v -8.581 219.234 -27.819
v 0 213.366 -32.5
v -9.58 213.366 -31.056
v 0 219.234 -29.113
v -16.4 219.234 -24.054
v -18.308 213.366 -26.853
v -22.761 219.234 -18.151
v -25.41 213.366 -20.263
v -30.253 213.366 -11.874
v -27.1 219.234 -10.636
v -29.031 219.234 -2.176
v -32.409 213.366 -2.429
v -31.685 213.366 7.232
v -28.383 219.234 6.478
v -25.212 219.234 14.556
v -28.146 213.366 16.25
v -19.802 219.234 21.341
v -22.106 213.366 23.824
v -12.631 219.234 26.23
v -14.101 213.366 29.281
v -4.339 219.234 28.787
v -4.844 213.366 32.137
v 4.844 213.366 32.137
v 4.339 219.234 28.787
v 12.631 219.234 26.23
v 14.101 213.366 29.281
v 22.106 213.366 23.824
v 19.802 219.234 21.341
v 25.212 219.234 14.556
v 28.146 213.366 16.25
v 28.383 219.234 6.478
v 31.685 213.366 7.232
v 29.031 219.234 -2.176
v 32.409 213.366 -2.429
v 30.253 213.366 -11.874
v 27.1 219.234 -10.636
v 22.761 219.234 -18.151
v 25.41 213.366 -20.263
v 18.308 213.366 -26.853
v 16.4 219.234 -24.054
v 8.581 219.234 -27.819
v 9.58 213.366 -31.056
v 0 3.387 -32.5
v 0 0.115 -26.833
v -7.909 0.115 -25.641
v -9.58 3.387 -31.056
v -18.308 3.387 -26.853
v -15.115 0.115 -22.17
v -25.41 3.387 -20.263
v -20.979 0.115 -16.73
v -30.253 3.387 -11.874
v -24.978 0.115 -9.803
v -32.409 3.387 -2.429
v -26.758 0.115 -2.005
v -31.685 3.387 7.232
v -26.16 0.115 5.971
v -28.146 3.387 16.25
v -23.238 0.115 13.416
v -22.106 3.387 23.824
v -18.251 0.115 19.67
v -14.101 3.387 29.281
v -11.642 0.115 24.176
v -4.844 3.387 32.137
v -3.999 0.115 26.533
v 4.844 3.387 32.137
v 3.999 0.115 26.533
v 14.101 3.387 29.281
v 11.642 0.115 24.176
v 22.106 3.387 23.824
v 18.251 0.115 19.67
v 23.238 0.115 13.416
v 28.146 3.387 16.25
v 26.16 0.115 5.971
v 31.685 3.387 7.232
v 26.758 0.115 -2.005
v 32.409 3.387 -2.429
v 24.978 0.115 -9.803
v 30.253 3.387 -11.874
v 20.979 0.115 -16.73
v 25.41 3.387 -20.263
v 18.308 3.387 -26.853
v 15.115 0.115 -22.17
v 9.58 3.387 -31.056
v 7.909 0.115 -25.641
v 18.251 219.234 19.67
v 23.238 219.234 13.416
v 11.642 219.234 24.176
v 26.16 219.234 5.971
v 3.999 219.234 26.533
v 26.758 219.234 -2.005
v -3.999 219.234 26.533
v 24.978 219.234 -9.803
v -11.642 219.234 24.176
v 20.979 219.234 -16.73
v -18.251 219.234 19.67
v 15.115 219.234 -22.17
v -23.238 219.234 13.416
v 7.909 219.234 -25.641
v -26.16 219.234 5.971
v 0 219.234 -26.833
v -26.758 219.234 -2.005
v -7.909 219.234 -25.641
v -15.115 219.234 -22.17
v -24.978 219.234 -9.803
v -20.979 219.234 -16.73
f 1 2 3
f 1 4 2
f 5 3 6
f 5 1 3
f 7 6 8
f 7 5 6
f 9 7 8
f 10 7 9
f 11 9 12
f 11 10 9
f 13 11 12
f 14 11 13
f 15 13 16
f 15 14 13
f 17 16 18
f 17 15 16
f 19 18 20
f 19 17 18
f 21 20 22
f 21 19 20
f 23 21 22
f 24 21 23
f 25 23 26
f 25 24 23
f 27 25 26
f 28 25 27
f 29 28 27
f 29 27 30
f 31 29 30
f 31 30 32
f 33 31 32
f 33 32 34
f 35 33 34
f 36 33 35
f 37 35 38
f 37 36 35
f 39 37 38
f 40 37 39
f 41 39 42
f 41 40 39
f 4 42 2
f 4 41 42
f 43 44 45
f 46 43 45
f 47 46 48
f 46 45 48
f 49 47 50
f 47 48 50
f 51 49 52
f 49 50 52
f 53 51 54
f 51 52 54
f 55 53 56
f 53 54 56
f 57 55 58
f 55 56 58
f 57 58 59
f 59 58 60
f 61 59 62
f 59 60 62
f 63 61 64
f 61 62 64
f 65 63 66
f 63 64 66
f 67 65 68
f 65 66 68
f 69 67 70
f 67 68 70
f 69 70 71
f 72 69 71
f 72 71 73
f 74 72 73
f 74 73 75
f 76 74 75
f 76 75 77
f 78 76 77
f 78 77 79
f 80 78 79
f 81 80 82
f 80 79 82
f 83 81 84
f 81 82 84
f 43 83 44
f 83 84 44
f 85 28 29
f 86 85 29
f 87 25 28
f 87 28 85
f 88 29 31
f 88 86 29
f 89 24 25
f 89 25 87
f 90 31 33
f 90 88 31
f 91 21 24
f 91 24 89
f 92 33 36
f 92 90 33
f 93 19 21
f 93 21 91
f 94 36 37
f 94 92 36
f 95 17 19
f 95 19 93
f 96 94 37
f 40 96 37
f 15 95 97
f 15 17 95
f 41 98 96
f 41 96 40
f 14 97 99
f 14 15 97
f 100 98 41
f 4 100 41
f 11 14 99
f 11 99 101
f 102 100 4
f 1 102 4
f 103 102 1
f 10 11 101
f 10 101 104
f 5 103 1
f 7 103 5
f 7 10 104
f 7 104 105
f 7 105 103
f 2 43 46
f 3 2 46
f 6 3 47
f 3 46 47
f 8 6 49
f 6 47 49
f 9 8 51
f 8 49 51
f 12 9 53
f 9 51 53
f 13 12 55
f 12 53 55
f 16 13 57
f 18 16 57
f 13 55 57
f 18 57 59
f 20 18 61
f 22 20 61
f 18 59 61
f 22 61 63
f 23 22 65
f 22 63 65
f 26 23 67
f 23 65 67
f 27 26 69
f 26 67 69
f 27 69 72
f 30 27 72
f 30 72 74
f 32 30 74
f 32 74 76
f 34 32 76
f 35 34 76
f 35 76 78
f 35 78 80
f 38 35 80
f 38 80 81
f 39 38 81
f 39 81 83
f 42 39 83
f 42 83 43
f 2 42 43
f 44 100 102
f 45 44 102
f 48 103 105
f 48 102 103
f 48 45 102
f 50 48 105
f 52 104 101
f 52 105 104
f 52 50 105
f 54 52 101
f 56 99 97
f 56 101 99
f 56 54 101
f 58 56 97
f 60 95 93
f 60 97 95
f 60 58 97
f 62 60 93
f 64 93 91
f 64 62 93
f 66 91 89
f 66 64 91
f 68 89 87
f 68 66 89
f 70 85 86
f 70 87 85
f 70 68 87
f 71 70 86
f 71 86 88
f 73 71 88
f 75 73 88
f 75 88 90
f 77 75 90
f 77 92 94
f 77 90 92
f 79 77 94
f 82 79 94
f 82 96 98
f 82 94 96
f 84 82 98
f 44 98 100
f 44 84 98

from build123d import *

# Parameters (mm, degrees)
SKETCH1_R           = 32.5
BOSS_EXTRUDE1_DEPTH = 219.233663
SKETCH2_R           = 26.832853827
CUT_EXTRUDE1_DEPTH  = 224.999774536
CHAMFER1_SIZE       = 5.867198
CHAMFER1_SIZE_2     = 3.387428


with BuildPart() as part:
    # Sketch1 → Boss-Extrude1 (new body)
    with BuildSketch(Plane(origin=(0, 0, 0), x_dir=(1, 0, 0), z_dir=(0, 1, 0))):
        with Locations(Location((0, 0, 0), (0, 0, 90))):
            Circle(SKETCH1_R)
    extrude(amount=BOSS_EXTRUDE1_DEPTH)

    # Sketch2 → Cut-Extrude1 (cut, through all)
    with BuildSketch(Plane(origin=(0, 0, 0), x_dir=(1, 0, 0), z_dir=(0, 1, 0))):
        with Locations(Location((0, 0, 0), (0, 0, 90))):
            Circle(SKETCH2_R)
    extrude(amount=CUT_EXTRUDE1_DEPTH, mode=Mode.SUBTRACT)

    # Chamfer1
    # the kernel refuses this chamfer: 5.867198, 3.387428 mm, written as the material it takes off along each edge
    with BuildSketch(Plane(origin=(0, 219.233663, 0), x_dir=(0, 0, -1), z_dir=(1, 0, 0))) as chamfer1_piece_1:
        Polygon((32.5, -CHAMFER1_SIZE), (32.5 - CHAMFER1_SIZE_2, 0), (32.5, 0), align=None)
    revolve(axis=Axis((0, 219.233663, 0), (0, 1, 0)), mode=Mode.SUBTRACT)
    with BuildSketch(Plane(origin=(0, 0, 0), x_dir=(0, 0, -1), z_dir=(1, 0, 0))) as chamfer1_piece_2:
        Polygon((32.5, CHAMFER1_SIZE_2), (32.5 - CHAMFER1_SIZE, 0), (32.5, 0), align=None)
    revolve(axis=Axis((0, 0, 0), (0, 1, 0)), mode=Mode.SUBTRACT)


solid = part.part
